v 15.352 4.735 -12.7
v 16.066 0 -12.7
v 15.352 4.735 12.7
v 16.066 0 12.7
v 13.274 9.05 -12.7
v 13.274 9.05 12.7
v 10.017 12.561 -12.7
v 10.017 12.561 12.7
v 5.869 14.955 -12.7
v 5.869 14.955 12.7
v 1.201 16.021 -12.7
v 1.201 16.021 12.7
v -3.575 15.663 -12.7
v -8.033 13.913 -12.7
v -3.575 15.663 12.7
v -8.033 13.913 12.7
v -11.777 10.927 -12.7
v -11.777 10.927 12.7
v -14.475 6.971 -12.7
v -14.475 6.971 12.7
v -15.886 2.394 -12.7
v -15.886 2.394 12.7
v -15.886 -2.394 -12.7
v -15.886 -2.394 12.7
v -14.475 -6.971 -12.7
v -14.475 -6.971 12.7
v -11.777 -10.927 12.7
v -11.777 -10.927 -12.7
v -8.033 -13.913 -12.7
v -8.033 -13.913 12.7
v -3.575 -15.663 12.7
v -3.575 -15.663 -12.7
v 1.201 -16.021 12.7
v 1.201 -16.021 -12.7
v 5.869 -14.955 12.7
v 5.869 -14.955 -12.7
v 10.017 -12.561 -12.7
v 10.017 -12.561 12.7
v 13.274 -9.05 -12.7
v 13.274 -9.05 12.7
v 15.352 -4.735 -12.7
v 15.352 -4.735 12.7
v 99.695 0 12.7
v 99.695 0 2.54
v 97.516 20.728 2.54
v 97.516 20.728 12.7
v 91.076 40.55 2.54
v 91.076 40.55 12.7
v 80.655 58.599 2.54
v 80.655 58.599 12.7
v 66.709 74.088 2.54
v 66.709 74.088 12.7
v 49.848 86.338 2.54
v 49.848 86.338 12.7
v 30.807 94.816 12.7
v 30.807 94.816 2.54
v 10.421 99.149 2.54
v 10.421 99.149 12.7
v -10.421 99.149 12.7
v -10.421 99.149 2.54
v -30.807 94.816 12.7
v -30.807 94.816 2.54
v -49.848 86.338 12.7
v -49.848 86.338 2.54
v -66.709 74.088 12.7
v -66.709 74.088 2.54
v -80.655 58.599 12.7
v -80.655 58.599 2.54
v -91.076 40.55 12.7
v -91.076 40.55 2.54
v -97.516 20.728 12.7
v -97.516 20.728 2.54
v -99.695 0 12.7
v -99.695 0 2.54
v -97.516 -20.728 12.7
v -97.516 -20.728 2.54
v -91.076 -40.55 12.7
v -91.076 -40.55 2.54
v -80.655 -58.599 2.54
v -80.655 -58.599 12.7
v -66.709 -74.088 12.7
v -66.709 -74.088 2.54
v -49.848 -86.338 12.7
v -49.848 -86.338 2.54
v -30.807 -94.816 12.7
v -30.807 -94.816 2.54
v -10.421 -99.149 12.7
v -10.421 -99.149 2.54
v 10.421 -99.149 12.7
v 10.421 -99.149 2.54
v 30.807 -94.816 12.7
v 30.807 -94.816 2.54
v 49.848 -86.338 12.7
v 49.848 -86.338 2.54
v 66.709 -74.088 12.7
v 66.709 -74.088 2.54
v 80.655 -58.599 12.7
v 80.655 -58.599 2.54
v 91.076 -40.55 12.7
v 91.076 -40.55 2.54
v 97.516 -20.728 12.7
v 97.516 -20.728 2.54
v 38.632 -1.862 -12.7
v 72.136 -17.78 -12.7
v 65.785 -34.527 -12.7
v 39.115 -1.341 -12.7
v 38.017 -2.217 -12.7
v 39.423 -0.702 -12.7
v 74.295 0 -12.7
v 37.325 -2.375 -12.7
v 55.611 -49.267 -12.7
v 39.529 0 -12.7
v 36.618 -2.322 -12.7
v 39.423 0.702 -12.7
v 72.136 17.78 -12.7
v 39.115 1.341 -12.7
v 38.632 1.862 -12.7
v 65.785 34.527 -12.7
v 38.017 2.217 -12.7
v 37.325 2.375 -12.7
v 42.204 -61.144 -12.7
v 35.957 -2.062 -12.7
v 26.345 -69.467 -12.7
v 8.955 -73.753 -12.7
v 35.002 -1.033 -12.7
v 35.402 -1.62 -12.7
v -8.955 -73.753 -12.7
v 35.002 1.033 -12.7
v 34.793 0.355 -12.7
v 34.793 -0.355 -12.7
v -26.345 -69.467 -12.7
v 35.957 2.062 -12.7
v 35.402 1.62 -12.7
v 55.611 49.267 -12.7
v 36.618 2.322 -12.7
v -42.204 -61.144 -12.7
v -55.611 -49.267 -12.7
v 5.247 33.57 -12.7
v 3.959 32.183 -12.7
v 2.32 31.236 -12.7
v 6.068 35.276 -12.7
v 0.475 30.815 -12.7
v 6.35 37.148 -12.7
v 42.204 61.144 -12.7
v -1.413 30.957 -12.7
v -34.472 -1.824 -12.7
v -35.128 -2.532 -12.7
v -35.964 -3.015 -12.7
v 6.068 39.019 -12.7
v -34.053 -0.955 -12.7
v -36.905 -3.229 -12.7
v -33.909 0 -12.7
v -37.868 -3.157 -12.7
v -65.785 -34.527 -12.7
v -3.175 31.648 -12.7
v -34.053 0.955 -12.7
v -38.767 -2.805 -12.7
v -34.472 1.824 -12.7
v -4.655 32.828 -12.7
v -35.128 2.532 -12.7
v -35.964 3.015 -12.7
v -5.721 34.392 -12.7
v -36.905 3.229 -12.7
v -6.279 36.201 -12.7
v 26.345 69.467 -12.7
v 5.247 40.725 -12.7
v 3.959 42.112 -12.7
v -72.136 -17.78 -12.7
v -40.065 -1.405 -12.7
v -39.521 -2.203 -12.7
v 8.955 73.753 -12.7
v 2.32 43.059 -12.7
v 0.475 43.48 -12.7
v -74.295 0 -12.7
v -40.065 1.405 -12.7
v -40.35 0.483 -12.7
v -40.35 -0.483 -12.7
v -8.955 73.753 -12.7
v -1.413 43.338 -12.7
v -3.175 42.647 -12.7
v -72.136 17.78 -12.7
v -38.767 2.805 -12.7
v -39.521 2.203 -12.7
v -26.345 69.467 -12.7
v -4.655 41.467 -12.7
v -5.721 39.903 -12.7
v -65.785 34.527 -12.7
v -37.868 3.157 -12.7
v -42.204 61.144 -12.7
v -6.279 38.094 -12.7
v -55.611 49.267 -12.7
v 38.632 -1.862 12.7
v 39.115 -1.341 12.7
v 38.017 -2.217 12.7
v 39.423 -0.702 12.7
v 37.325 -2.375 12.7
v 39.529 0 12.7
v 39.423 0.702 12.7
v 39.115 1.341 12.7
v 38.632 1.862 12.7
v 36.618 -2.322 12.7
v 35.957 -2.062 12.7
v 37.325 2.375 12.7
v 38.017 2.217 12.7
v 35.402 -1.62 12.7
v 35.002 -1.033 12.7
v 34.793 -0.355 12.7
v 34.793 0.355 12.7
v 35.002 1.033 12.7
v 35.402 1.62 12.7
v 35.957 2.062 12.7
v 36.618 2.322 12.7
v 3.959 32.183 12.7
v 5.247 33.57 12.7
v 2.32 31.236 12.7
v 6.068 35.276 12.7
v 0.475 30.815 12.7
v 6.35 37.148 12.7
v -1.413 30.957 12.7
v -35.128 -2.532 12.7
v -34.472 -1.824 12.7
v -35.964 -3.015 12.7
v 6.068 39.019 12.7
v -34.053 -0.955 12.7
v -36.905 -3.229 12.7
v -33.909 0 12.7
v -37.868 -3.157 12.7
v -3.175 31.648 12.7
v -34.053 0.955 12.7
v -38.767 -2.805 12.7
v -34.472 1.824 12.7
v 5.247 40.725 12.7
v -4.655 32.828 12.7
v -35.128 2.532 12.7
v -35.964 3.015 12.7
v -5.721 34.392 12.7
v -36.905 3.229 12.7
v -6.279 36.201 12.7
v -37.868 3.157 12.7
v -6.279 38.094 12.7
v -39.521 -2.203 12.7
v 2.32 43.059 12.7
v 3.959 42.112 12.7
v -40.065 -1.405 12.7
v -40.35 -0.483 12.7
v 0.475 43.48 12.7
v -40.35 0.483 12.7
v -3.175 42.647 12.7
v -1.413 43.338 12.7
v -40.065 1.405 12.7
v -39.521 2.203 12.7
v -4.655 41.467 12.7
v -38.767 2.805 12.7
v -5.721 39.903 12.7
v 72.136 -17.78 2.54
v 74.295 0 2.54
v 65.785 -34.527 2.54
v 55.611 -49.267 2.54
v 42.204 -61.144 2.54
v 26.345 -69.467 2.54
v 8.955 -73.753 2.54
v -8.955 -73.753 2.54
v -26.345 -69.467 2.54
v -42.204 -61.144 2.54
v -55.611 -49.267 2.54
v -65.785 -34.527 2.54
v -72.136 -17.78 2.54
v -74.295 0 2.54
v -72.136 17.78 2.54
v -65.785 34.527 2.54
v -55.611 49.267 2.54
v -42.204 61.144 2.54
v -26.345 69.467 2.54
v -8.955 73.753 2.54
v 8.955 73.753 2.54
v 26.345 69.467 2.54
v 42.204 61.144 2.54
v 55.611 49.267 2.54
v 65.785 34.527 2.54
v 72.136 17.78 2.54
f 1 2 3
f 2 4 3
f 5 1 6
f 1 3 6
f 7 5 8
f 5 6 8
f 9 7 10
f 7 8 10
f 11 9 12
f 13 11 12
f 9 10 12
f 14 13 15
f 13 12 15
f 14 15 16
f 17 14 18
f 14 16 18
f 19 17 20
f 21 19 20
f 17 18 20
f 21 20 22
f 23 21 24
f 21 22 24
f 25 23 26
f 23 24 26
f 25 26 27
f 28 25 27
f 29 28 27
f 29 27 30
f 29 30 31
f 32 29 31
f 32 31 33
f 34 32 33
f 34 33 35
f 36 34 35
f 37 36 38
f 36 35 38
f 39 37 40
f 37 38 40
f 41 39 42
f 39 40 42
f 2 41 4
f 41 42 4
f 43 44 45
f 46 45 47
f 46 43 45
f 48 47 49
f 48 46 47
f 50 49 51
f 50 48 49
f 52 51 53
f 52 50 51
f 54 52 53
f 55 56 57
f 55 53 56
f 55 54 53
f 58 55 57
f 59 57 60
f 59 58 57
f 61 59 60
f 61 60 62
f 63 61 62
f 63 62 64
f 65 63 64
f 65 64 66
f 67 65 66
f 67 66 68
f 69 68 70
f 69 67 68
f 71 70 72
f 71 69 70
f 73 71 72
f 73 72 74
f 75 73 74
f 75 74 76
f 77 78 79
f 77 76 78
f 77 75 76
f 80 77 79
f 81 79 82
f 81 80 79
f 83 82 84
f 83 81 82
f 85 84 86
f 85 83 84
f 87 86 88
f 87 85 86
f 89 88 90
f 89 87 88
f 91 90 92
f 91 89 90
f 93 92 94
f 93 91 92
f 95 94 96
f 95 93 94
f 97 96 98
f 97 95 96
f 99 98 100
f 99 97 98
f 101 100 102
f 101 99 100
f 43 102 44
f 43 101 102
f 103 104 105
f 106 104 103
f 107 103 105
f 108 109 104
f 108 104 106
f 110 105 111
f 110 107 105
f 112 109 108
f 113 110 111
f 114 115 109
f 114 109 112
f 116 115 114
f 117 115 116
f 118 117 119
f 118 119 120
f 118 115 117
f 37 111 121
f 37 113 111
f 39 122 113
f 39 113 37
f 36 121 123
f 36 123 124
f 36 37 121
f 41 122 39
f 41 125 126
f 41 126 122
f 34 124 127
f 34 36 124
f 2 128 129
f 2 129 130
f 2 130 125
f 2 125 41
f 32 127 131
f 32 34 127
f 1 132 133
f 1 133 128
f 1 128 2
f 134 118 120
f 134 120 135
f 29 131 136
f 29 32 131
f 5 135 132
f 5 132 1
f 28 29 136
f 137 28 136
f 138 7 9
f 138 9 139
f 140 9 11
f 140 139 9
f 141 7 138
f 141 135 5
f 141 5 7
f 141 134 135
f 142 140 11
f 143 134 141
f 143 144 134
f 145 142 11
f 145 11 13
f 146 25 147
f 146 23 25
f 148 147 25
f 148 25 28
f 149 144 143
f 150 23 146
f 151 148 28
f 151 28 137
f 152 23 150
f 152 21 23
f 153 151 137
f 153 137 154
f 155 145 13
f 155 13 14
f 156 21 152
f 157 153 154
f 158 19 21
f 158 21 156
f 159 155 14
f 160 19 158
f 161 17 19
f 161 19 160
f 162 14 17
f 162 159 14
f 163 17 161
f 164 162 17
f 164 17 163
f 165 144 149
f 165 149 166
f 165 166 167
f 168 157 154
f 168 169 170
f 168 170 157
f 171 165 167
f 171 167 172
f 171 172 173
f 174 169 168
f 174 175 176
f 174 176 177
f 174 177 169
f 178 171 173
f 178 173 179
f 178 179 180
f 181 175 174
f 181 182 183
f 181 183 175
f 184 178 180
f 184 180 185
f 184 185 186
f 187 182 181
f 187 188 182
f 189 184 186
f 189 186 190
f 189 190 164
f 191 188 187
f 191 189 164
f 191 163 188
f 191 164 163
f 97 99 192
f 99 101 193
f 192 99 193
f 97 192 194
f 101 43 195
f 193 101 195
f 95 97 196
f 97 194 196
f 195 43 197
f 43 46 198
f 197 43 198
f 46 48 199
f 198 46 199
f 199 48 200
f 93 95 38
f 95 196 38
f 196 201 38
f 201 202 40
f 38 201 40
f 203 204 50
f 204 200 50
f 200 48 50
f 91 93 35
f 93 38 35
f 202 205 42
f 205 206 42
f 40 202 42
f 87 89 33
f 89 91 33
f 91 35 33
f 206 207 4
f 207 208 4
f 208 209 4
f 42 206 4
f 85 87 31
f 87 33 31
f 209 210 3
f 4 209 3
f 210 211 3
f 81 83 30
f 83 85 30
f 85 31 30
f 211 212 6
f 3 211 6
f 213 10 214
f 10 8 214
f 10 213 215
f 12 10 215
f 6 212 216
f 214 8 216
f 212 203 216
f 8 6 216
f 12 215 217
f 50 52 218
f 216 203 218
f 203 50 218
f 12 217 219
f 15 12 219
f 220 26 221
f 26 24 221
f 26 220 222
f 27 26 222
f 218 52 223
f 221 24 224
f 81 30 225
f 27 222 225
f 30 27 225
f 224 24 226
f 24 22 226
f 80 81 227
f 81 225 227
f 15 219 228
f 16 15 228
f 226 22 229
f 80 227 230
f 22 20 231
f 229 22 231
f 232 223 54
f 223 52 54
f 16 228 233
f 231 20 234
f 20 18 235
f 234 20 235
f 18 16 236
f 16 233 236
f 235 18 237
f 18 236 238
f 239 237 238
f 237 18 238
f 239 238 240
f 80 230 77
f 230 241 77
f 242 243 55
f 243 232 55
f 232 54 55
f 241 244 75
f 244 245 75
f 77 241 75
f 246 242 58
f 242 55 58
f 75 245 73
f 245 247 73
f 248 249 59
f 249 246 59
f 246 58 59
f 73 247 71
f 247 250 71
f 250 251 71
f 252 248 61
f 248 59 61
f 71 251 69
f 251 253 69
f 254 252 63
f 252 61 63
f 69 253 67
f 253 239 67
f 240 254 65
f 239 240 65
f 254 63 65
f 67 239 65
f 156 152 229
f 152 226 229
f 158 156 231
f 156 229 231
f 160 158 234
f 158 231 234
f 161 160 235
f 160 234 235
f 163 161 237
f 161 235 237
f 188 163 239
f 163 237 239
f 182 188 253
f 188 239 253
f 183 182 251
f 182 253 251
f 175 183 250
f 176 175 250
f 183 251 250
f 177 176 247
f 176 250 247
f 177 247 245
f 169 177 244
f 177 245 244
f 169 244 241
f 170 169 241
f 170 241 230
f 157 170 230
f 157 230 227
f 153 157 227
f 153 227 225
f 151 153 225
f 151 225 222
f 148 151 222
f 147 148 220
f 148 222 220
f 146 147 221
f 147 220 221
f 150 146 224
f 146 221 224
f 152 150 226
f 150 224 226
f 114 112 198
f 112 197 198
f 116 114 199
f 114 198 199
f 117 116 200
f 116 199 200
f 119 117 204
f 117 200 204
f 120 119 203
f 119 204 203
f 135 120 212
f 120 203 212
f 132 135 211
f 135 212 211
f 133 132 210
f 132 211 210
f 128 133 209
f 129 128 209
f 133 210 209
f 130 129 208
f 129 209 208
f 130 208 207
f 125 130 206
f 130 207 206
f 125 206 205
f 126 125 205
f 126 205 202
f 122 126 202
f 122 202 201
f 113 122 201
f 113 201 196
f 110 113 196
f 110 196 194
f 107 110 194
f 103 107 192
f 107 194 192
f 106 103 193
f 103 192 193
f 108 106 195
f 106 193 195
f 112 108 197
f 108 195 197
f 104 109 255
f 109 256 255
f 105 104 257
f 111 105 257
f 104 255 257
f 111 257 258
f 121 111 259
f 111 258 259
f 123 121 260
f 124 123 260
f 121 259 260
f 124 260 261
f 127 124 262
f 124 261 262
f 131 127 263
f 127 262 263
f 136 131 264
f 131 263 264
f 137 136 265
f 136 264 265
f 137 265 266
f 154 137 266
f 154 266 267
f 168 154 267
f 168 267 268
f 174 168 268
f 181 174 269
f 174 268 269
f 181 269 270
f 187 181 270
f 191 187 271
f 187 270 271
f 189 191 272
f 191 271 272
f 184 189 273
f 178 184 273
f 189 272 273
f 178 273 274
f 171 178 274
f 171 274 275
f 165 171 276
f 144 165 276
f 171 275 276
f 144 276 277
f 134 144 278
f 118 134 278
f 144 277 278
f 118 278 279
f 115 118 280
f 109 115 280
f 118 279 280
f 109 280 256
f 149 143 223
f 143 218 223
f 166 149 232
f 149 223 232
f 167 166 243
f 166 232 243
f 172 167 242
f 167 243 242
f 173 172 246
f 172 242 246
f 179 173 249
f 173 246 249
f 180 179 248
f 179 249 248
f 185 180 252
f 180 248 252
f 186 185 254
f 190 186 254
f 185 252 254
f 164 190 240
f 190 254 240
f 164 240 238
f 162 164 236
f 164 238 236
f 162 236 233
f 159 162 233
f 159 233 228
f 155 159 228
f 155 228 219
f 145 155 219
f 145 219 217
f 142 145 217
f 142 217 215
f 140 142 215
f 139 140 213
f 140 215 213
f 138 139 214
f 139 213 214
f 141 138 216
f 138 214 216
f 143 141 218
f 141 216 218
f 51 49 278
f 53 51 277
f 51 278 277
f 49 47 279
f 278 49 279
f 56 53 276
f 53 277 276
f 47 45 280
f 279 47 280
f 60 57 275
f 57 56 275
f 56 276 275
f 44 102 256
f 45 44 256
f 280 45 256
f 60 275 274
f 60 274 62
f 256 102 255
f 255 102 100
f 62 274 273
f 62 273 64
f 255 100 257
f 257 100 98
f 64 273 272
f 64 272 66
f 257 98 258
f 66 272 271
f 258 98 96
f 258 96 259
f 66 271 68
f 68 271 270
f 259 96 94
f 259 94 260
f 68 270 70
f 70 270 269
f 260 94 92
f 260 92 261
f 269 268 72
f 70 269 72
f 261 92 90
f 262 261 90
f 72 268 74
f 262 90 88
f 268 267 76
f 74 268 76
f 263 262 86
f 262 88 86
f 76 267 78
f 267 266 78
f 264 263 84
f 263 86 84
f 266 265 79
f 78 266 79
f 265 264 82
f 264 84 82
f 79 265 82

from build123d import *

# Parameters (mm, degrees)
F0_W          = 83.6295
F0_H          = 25.4
F2_R          = 2.38125
F2_R_2        = 3.2385
F2_R_3        = 6.35
F3_DEPTH      = 12.701
F3_DEPTH_BACK = 12.701
F4_W          = 25.4
F4_H          = 15.24


with BuildPart() as f1:
    # F0 (on Front) → F1 (revolve)
    with BuildSketch(Plane.XZ):
        with Locations((57.88025, 0)):
            Rectangle(F0_W, F0_H)
    revolve(axis=Axis((0, 0, 0), (0, 0, 1)))

    # F2 (on Top) → F3 (cut, two sides)
    with BuildSketch(Plane.XY) as f3_sk:
        with Locations((37.1475, 0)):
            Circle(F2_R)
        with Locations((-37.1475, 0)):
            Circle(F2_R_2)
        with Locations((0, 37.1475)):
            Circle(F2_R_3)
    extrude(amount=-F3_DEPTH, mode=Mode.SUBTRACT)
    extrude(f3_sk.sketch, amount=F3_DEPTH_BACK, mode=Mode.SUBTRACT)

    # F4 (on Front) → F5 (revolve, cut)
    with BuildSketch(Plane.XZ):
        with Locations((86.995, -5.08)):
            Rectangle(F4_W, F4_H)
    revolve(axis=Axis((0, 0, 0.5814679898), (0, 0, -1)), mode=Mode.SUBTRACT)


solid = f1.part
